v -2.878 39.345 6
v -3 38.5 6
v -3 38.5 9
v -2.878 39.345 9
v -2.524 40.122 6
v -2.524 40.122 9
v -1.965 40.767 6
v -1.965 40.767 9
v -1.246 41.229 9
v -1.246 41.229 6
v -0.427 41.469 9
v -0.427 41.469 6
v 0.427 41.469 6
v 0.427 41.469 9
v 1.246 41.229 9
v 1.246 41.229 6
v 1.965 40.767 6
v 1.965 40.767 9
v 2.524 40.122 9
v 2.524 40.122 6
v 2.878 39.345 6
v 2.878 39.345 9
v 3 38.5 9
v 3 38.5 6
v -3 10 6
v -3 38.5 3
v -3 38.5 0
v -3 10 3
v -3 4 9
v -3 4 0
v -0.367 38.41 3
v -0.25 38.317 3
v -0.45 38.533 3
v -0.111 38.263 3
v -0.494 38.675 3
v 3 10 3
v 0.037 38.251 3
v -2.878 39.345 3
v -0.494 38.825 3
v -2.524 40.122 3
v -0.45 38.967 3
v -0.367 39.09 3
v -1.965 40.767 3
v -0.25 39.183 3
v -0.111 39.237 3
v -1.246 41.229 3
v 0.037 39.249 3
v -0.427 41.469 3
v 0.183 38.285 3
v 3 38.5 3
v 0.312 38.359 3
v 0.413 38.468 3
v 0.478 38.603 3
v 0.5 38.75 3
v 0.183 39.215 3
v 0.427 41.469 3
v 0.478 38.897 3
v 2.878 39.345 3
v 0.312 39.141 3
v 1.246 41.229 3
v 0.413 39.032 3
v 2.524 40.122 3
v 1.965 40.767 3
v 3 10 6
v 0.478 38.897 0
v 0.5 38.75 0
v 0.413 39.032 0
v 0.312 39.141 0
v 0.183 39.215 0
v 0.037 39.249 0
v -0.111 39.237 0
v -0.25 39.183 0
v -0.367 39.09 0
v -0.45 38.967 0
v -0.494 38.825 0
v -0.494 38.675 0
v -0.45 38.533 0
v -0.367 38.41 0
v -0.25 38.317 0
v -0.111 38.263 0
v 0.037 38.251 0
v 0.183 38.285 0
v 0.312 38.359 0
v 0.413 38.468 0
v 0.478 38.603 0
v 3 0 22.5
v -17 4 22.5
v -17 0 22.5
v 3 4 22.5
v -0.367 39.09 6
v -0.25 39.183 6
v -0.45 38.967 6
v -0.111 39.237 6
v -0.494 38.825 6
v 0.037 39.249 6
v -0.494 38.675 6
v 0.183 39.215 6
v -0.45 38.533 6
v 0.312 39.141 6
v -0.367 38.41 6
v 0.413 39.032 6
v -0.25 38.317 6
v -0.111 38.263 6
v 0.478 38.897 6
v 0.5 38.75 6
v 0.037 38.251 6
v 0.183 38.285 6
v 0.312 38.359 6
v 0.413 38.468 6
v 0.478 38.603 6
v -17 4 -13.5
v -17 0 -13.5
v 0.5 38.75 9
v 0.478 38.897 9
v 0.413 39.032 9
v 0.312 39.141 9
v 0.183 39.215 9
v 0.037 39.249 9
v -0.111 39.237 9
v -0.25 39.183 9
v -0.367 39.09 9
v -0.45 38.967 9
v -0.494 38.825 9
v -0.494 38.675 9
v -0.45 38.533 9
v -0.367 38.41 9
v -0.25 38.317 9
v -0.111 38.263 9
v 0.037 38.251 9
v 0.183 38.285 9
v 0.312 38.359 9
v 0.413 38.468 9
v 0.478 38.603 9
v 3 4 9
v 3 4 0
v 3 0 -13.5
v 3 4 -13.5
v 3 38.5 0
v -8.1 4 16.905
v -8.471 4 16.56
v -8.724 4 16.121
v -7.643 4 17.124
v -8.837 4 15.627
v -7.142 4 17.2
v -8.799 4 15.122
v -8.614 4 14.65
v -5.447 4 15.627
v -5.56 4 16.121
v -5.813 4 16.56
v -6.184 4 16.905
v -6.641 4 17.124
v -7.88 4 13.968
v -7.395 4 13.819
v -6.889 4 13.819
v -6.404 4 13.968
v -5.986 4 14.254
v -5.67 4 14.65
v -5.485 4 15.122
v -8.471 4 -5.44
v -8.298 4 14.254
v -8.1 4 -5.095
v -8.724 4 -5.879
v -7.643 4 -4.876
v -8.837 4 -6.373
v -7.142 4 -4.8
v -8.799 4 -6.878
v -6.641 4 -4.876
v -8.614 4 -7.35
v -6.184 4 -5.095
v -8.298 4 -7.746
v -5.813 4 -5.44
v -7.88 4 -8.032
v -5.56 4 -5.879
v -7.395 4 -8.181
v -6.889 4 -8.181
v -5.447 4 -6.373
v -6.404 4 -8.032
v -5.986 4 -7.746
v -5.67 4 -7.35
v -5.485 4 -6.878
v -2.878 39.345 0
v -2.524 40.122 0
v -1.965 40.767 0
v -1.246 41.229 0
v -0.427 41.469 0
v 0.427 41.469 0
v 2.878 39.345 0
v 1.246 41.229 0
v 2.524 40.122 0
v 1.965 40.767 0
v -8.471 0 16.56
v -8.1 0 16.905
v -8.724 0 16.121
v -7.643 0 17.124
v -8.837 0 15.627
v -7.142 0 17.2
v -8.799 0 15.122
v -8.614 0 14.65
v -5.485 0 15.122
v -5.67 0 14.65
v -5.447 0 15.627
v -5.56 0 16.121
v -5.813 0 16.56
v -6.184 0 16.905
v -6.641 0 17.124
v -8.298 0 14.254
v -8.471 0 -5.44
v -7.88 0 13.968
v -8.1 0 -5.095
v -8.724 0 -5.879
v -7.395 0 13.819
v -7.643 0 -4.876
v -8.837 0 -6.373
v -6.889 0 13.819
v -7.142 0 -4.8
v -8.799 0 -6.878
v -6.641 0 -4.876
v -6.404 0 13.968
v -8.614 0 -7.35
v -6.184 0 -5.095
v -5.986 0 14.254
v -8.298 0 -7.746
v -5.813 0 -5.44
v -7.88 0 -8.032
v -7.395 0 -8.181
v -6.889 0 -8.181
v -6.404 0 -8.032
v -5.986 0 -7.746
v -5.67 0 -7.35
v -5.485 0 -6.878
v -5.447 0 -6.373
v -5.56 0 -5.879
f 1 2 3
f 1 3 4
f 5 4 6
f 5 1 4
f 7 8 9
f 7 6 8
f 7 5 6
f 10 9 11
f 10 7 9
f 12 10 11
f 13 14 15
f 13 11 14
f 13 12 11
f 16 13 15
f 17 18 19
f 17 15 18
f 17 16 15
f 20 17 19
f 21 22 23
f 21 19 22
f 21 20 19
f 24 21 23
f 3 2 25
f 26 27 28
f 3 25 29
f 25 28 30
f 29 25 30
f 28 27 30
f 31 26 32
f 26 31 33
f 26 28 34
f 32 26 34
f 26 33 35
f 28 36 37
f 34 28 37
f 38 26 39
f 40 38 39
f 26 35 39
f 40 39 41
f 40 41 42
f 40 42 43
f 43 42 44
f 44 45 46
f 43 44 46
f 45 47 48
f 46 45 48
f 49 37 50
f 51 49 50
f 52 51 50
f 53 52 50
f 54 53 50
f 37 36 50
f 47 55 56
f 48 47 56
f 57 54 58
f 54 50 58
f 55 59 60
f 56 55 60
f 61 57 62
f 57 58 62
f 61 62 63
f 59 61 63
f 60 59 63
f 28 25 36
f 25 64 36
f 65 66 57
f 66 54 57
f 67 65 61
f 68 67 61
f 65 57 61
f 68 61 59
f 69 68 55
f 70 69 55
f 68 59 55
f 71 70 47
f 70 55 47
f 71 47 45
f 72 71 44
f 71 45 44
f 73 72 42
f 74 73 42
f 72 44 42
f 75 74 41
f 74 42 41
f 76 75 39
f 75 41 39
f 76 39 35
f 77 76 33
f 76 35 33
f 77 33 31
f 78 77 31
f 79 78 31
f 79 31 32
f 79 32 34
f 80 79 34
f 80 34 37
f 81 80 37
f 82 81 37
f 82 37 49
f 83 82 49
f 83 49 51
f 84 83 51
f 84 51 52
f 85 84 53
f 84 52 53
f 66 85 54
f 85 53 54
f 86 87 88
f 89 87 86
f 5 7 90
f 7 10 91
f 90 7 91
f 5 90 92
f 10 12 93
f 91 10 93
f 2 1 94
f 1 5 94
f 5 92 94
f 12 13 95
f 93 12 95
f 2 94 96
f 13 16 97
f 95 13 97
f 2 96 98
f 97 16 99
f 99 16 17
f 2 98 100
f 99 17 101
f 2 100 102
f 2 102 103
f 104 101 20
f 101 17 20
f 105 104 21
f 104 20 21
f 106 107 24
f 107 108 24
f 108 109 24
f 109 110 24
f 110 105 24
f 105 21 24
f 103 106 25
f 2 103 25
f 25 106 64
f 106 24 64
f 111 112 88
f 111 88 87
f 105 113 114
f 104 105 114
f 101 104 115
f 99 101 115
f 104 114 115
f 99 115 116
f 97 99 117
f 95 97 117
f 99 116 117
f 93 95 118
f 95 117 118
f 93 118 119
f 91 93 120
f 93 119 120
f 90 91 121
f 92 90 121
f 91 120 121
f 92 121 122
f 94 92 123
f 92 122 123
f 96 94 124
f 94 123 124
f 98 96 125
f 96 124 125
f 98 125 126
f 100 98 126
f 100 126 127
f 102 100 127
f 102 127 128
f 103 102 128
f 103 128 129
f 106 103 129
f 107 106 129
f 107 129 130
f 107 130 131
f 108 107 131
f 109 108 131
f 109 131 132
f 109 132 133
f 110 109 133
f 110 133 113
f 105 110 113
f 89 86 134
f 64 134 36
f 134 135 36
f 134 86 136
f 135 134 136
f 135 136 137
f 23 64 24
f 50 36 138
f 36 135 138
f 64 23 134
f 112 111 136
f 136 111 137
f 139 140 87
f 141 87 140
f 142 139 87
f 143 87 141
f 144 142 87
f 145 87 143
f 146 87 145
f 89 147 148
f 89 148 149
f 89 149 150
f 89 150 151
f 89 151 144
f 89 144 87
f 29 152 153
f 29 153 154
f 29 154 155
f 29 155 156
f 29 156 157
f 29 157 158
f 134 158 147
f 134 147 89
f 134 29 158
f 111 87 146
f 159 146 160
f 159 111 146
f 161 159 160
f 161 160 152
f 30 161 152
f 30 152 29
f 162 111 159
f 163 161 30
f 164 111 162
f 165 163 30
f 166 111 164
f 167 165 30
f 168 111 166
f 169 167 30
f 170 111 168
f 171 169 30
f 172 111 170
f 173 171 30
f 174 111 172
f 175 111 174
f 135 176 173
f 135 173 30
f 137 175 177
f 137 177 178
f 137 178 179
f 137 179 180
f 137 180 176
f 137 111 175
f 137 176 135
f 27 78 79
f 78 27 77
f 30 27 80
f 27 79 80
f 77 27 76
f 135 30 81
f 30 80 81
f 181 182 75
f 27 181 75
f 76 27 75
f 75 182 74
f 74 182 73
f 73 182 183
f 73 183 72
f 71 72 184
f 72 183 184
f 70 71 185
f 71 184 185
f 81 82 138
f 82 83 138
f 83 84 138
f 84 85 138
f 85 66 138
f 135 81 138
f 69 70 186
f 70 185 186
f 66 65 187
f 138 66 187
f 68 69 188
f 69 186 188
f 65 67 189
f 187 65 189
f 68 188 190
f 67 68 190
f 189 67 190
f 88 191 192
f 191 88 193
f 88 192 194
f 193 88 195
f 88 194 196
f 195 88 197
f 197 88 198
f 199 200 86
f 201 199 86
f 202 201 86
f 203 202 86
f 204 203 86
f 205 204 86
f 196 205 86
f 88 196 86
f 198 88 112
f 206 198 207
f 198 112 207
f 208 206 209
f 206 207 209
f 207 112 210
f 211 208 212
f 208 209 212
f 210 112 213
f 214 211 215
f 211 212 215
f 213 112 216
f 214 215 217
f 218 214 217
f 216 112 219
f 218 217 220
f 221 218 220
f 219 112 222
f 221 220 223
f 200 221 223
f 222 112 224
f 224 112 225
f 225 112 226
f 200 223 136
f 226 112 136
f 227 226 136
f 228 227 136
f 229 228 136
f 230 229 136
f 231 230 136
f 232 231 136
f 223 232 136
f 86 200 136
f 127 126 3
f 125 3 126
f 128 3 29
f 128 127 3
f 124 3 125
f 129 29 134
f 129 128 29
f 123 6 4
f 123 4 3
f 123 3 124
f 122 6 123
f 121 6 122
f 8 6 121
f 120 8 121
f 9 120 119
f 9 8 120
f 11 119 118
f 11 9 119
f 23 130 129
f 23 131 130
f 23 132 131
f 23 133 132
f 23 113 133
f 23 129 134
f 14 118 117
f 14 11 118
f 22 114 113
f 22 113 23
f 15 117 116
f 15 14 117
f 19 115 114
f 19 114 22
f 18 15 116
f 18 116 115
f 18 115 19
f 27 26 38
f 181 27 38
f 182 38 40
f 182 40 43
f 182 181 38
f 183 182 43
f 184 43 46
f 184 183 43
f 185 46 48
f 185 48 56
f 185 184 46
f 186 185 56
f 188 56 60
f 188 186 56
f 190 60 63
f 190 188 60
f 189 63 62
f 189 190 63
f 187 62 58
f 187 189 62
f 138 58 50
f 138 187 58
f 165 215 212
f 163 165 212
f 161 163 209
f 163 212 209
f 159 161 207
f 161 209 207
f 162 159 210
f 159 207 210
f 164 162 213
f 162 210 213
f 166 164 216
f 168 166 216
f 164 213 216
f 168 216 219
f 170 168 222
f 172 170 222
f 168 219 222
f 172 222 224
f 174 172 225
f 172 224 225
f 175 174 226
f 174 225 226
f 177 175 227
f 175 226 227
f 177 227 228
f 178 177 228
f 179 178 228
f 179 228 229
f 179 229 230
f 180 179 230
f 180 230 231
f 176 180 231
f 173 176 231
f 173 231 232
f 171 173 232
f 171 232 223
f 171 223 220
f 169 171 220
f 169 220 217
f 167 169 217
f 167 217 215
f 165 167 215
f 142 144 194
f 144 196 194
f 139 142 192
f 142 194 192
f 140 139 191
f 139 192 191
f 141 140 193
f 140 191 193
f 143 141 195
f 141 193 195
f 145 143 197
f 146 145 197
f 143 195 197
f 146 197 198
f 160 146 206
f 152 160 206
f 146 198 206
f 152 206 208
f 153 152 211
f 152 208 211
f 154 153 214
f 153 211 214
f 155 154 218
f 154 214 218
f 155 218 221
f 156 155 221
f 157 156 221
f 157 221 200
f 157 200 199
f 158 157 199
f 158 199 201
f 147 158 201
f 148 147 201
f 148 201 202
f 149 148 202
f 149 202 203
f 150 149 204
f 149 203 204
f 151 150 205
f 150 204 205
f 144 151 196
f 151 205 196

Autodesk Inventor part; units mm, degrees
ref_plane "YZ Plane" through (0, 0, 0) normal (1, 0, 0) x (0, 1, 0)
ref_plane "XZ Plane" through (0, 0, 0) normal (0, 1, 0) x (-1, 0, 0)
ref_plane "XY Plane" through (0, 0, 0) normal (0, 0, 1) x (1, 0, 0)
sketch "Sketch1" plane through (0, 0, 0) normal (0, 0, 1) x (1, 0, 0)
  line L0 (-3, 38.5) -> (-3, 0)
  line L1 (-3, 0) -> (3, 0)
  line L2 (3, 0) -> (3, 38.5)
  line L3 (-3, 38.5) -> (-3, 36)
  arc A0 (3, 38.5) -> (-3, 38.5) centre (0, 38.5) ccw
  point P0 (0, 0)
extrude "Extrusion1" add sketch "Sketch1" along normal blind 9
sketch "Sketch2" plane through (3, 0, 0) normal (1, 0, 0) x (0, 0, -1)
  line L0 (-3, 41.5) -> (-6, 41.5)
  line L1 (-6, 41.5) -> (-6, 10)
  line L2 (-6, 10) -> (-3, 10)
  line L3 (-3, 10) -> (-3, 41.5)
  point P0 (0, 0)
  point P1 (-9, 41.5)
extrude "Extrusion2" cut sketch "Sketch2" against normal through all
sketch "Sketch3" plane through (0, 0, 9) normal (0, 0, 1) x (1, 0, 0)
  line L0 (-3, 38.5) -> (-3, 0) projected
  line L1 (-3, 4) -> (3, 4)
  line L2 (3, 0) -> (-17, 0)
  line L3 (-17, 0) -> (-17, 4)
  line L4 (-17, 4) -> (3, 4)
  line L5 (3, 0) -> (3, 4)
  line L6 (3, 0) -> (3, 38.5) projected
  point P0 (0, 0)
  dimension "d77" = 20
sketch "Sketch8" plane through (0, 0, 9) normal (0, 0, 1) x (1, 0, 0)
  arc A0 (3, 38.5) -> (-3, 38.5) centre (0, 38.5) ccw construction
  line L0 (0, 41.5) -> (0, 38.75) construction
  circle A1 centre (0, 38.75) radius 0.5
  point P0 (0, 0)
  dimension "d68" = 2.75
  dimension "d69" = 1
extrude "Extrusion6" cut sketch "Sketch8" against normal through all
extrude "Extrusion7" add sketch "Sketch3" along normal blind 13.5 and the other way blind 22.5
sketch "Sketch10" plane through (-3, 4, 9) normal (0, 1, 0) x (1, 0, 0)
  point P0 (3, 9)
  point P1 (6, 22.5)
  point P2 (6, -13.5)
  point P3 (-4.142, -6.5)
  point P4 (-4.142, 15.5)
hole "Hole4" at (-7.142, 4, 15.5) at (-7.142, 4, -6.5) direction (0, -1, 0) diameter 3.4 end through all clearance for "Hex Head Cap Screw ISO 24017" size "M3" standard "ISO"
properties part number "Podstawka" material "Stainless Steel, Austenitic"
